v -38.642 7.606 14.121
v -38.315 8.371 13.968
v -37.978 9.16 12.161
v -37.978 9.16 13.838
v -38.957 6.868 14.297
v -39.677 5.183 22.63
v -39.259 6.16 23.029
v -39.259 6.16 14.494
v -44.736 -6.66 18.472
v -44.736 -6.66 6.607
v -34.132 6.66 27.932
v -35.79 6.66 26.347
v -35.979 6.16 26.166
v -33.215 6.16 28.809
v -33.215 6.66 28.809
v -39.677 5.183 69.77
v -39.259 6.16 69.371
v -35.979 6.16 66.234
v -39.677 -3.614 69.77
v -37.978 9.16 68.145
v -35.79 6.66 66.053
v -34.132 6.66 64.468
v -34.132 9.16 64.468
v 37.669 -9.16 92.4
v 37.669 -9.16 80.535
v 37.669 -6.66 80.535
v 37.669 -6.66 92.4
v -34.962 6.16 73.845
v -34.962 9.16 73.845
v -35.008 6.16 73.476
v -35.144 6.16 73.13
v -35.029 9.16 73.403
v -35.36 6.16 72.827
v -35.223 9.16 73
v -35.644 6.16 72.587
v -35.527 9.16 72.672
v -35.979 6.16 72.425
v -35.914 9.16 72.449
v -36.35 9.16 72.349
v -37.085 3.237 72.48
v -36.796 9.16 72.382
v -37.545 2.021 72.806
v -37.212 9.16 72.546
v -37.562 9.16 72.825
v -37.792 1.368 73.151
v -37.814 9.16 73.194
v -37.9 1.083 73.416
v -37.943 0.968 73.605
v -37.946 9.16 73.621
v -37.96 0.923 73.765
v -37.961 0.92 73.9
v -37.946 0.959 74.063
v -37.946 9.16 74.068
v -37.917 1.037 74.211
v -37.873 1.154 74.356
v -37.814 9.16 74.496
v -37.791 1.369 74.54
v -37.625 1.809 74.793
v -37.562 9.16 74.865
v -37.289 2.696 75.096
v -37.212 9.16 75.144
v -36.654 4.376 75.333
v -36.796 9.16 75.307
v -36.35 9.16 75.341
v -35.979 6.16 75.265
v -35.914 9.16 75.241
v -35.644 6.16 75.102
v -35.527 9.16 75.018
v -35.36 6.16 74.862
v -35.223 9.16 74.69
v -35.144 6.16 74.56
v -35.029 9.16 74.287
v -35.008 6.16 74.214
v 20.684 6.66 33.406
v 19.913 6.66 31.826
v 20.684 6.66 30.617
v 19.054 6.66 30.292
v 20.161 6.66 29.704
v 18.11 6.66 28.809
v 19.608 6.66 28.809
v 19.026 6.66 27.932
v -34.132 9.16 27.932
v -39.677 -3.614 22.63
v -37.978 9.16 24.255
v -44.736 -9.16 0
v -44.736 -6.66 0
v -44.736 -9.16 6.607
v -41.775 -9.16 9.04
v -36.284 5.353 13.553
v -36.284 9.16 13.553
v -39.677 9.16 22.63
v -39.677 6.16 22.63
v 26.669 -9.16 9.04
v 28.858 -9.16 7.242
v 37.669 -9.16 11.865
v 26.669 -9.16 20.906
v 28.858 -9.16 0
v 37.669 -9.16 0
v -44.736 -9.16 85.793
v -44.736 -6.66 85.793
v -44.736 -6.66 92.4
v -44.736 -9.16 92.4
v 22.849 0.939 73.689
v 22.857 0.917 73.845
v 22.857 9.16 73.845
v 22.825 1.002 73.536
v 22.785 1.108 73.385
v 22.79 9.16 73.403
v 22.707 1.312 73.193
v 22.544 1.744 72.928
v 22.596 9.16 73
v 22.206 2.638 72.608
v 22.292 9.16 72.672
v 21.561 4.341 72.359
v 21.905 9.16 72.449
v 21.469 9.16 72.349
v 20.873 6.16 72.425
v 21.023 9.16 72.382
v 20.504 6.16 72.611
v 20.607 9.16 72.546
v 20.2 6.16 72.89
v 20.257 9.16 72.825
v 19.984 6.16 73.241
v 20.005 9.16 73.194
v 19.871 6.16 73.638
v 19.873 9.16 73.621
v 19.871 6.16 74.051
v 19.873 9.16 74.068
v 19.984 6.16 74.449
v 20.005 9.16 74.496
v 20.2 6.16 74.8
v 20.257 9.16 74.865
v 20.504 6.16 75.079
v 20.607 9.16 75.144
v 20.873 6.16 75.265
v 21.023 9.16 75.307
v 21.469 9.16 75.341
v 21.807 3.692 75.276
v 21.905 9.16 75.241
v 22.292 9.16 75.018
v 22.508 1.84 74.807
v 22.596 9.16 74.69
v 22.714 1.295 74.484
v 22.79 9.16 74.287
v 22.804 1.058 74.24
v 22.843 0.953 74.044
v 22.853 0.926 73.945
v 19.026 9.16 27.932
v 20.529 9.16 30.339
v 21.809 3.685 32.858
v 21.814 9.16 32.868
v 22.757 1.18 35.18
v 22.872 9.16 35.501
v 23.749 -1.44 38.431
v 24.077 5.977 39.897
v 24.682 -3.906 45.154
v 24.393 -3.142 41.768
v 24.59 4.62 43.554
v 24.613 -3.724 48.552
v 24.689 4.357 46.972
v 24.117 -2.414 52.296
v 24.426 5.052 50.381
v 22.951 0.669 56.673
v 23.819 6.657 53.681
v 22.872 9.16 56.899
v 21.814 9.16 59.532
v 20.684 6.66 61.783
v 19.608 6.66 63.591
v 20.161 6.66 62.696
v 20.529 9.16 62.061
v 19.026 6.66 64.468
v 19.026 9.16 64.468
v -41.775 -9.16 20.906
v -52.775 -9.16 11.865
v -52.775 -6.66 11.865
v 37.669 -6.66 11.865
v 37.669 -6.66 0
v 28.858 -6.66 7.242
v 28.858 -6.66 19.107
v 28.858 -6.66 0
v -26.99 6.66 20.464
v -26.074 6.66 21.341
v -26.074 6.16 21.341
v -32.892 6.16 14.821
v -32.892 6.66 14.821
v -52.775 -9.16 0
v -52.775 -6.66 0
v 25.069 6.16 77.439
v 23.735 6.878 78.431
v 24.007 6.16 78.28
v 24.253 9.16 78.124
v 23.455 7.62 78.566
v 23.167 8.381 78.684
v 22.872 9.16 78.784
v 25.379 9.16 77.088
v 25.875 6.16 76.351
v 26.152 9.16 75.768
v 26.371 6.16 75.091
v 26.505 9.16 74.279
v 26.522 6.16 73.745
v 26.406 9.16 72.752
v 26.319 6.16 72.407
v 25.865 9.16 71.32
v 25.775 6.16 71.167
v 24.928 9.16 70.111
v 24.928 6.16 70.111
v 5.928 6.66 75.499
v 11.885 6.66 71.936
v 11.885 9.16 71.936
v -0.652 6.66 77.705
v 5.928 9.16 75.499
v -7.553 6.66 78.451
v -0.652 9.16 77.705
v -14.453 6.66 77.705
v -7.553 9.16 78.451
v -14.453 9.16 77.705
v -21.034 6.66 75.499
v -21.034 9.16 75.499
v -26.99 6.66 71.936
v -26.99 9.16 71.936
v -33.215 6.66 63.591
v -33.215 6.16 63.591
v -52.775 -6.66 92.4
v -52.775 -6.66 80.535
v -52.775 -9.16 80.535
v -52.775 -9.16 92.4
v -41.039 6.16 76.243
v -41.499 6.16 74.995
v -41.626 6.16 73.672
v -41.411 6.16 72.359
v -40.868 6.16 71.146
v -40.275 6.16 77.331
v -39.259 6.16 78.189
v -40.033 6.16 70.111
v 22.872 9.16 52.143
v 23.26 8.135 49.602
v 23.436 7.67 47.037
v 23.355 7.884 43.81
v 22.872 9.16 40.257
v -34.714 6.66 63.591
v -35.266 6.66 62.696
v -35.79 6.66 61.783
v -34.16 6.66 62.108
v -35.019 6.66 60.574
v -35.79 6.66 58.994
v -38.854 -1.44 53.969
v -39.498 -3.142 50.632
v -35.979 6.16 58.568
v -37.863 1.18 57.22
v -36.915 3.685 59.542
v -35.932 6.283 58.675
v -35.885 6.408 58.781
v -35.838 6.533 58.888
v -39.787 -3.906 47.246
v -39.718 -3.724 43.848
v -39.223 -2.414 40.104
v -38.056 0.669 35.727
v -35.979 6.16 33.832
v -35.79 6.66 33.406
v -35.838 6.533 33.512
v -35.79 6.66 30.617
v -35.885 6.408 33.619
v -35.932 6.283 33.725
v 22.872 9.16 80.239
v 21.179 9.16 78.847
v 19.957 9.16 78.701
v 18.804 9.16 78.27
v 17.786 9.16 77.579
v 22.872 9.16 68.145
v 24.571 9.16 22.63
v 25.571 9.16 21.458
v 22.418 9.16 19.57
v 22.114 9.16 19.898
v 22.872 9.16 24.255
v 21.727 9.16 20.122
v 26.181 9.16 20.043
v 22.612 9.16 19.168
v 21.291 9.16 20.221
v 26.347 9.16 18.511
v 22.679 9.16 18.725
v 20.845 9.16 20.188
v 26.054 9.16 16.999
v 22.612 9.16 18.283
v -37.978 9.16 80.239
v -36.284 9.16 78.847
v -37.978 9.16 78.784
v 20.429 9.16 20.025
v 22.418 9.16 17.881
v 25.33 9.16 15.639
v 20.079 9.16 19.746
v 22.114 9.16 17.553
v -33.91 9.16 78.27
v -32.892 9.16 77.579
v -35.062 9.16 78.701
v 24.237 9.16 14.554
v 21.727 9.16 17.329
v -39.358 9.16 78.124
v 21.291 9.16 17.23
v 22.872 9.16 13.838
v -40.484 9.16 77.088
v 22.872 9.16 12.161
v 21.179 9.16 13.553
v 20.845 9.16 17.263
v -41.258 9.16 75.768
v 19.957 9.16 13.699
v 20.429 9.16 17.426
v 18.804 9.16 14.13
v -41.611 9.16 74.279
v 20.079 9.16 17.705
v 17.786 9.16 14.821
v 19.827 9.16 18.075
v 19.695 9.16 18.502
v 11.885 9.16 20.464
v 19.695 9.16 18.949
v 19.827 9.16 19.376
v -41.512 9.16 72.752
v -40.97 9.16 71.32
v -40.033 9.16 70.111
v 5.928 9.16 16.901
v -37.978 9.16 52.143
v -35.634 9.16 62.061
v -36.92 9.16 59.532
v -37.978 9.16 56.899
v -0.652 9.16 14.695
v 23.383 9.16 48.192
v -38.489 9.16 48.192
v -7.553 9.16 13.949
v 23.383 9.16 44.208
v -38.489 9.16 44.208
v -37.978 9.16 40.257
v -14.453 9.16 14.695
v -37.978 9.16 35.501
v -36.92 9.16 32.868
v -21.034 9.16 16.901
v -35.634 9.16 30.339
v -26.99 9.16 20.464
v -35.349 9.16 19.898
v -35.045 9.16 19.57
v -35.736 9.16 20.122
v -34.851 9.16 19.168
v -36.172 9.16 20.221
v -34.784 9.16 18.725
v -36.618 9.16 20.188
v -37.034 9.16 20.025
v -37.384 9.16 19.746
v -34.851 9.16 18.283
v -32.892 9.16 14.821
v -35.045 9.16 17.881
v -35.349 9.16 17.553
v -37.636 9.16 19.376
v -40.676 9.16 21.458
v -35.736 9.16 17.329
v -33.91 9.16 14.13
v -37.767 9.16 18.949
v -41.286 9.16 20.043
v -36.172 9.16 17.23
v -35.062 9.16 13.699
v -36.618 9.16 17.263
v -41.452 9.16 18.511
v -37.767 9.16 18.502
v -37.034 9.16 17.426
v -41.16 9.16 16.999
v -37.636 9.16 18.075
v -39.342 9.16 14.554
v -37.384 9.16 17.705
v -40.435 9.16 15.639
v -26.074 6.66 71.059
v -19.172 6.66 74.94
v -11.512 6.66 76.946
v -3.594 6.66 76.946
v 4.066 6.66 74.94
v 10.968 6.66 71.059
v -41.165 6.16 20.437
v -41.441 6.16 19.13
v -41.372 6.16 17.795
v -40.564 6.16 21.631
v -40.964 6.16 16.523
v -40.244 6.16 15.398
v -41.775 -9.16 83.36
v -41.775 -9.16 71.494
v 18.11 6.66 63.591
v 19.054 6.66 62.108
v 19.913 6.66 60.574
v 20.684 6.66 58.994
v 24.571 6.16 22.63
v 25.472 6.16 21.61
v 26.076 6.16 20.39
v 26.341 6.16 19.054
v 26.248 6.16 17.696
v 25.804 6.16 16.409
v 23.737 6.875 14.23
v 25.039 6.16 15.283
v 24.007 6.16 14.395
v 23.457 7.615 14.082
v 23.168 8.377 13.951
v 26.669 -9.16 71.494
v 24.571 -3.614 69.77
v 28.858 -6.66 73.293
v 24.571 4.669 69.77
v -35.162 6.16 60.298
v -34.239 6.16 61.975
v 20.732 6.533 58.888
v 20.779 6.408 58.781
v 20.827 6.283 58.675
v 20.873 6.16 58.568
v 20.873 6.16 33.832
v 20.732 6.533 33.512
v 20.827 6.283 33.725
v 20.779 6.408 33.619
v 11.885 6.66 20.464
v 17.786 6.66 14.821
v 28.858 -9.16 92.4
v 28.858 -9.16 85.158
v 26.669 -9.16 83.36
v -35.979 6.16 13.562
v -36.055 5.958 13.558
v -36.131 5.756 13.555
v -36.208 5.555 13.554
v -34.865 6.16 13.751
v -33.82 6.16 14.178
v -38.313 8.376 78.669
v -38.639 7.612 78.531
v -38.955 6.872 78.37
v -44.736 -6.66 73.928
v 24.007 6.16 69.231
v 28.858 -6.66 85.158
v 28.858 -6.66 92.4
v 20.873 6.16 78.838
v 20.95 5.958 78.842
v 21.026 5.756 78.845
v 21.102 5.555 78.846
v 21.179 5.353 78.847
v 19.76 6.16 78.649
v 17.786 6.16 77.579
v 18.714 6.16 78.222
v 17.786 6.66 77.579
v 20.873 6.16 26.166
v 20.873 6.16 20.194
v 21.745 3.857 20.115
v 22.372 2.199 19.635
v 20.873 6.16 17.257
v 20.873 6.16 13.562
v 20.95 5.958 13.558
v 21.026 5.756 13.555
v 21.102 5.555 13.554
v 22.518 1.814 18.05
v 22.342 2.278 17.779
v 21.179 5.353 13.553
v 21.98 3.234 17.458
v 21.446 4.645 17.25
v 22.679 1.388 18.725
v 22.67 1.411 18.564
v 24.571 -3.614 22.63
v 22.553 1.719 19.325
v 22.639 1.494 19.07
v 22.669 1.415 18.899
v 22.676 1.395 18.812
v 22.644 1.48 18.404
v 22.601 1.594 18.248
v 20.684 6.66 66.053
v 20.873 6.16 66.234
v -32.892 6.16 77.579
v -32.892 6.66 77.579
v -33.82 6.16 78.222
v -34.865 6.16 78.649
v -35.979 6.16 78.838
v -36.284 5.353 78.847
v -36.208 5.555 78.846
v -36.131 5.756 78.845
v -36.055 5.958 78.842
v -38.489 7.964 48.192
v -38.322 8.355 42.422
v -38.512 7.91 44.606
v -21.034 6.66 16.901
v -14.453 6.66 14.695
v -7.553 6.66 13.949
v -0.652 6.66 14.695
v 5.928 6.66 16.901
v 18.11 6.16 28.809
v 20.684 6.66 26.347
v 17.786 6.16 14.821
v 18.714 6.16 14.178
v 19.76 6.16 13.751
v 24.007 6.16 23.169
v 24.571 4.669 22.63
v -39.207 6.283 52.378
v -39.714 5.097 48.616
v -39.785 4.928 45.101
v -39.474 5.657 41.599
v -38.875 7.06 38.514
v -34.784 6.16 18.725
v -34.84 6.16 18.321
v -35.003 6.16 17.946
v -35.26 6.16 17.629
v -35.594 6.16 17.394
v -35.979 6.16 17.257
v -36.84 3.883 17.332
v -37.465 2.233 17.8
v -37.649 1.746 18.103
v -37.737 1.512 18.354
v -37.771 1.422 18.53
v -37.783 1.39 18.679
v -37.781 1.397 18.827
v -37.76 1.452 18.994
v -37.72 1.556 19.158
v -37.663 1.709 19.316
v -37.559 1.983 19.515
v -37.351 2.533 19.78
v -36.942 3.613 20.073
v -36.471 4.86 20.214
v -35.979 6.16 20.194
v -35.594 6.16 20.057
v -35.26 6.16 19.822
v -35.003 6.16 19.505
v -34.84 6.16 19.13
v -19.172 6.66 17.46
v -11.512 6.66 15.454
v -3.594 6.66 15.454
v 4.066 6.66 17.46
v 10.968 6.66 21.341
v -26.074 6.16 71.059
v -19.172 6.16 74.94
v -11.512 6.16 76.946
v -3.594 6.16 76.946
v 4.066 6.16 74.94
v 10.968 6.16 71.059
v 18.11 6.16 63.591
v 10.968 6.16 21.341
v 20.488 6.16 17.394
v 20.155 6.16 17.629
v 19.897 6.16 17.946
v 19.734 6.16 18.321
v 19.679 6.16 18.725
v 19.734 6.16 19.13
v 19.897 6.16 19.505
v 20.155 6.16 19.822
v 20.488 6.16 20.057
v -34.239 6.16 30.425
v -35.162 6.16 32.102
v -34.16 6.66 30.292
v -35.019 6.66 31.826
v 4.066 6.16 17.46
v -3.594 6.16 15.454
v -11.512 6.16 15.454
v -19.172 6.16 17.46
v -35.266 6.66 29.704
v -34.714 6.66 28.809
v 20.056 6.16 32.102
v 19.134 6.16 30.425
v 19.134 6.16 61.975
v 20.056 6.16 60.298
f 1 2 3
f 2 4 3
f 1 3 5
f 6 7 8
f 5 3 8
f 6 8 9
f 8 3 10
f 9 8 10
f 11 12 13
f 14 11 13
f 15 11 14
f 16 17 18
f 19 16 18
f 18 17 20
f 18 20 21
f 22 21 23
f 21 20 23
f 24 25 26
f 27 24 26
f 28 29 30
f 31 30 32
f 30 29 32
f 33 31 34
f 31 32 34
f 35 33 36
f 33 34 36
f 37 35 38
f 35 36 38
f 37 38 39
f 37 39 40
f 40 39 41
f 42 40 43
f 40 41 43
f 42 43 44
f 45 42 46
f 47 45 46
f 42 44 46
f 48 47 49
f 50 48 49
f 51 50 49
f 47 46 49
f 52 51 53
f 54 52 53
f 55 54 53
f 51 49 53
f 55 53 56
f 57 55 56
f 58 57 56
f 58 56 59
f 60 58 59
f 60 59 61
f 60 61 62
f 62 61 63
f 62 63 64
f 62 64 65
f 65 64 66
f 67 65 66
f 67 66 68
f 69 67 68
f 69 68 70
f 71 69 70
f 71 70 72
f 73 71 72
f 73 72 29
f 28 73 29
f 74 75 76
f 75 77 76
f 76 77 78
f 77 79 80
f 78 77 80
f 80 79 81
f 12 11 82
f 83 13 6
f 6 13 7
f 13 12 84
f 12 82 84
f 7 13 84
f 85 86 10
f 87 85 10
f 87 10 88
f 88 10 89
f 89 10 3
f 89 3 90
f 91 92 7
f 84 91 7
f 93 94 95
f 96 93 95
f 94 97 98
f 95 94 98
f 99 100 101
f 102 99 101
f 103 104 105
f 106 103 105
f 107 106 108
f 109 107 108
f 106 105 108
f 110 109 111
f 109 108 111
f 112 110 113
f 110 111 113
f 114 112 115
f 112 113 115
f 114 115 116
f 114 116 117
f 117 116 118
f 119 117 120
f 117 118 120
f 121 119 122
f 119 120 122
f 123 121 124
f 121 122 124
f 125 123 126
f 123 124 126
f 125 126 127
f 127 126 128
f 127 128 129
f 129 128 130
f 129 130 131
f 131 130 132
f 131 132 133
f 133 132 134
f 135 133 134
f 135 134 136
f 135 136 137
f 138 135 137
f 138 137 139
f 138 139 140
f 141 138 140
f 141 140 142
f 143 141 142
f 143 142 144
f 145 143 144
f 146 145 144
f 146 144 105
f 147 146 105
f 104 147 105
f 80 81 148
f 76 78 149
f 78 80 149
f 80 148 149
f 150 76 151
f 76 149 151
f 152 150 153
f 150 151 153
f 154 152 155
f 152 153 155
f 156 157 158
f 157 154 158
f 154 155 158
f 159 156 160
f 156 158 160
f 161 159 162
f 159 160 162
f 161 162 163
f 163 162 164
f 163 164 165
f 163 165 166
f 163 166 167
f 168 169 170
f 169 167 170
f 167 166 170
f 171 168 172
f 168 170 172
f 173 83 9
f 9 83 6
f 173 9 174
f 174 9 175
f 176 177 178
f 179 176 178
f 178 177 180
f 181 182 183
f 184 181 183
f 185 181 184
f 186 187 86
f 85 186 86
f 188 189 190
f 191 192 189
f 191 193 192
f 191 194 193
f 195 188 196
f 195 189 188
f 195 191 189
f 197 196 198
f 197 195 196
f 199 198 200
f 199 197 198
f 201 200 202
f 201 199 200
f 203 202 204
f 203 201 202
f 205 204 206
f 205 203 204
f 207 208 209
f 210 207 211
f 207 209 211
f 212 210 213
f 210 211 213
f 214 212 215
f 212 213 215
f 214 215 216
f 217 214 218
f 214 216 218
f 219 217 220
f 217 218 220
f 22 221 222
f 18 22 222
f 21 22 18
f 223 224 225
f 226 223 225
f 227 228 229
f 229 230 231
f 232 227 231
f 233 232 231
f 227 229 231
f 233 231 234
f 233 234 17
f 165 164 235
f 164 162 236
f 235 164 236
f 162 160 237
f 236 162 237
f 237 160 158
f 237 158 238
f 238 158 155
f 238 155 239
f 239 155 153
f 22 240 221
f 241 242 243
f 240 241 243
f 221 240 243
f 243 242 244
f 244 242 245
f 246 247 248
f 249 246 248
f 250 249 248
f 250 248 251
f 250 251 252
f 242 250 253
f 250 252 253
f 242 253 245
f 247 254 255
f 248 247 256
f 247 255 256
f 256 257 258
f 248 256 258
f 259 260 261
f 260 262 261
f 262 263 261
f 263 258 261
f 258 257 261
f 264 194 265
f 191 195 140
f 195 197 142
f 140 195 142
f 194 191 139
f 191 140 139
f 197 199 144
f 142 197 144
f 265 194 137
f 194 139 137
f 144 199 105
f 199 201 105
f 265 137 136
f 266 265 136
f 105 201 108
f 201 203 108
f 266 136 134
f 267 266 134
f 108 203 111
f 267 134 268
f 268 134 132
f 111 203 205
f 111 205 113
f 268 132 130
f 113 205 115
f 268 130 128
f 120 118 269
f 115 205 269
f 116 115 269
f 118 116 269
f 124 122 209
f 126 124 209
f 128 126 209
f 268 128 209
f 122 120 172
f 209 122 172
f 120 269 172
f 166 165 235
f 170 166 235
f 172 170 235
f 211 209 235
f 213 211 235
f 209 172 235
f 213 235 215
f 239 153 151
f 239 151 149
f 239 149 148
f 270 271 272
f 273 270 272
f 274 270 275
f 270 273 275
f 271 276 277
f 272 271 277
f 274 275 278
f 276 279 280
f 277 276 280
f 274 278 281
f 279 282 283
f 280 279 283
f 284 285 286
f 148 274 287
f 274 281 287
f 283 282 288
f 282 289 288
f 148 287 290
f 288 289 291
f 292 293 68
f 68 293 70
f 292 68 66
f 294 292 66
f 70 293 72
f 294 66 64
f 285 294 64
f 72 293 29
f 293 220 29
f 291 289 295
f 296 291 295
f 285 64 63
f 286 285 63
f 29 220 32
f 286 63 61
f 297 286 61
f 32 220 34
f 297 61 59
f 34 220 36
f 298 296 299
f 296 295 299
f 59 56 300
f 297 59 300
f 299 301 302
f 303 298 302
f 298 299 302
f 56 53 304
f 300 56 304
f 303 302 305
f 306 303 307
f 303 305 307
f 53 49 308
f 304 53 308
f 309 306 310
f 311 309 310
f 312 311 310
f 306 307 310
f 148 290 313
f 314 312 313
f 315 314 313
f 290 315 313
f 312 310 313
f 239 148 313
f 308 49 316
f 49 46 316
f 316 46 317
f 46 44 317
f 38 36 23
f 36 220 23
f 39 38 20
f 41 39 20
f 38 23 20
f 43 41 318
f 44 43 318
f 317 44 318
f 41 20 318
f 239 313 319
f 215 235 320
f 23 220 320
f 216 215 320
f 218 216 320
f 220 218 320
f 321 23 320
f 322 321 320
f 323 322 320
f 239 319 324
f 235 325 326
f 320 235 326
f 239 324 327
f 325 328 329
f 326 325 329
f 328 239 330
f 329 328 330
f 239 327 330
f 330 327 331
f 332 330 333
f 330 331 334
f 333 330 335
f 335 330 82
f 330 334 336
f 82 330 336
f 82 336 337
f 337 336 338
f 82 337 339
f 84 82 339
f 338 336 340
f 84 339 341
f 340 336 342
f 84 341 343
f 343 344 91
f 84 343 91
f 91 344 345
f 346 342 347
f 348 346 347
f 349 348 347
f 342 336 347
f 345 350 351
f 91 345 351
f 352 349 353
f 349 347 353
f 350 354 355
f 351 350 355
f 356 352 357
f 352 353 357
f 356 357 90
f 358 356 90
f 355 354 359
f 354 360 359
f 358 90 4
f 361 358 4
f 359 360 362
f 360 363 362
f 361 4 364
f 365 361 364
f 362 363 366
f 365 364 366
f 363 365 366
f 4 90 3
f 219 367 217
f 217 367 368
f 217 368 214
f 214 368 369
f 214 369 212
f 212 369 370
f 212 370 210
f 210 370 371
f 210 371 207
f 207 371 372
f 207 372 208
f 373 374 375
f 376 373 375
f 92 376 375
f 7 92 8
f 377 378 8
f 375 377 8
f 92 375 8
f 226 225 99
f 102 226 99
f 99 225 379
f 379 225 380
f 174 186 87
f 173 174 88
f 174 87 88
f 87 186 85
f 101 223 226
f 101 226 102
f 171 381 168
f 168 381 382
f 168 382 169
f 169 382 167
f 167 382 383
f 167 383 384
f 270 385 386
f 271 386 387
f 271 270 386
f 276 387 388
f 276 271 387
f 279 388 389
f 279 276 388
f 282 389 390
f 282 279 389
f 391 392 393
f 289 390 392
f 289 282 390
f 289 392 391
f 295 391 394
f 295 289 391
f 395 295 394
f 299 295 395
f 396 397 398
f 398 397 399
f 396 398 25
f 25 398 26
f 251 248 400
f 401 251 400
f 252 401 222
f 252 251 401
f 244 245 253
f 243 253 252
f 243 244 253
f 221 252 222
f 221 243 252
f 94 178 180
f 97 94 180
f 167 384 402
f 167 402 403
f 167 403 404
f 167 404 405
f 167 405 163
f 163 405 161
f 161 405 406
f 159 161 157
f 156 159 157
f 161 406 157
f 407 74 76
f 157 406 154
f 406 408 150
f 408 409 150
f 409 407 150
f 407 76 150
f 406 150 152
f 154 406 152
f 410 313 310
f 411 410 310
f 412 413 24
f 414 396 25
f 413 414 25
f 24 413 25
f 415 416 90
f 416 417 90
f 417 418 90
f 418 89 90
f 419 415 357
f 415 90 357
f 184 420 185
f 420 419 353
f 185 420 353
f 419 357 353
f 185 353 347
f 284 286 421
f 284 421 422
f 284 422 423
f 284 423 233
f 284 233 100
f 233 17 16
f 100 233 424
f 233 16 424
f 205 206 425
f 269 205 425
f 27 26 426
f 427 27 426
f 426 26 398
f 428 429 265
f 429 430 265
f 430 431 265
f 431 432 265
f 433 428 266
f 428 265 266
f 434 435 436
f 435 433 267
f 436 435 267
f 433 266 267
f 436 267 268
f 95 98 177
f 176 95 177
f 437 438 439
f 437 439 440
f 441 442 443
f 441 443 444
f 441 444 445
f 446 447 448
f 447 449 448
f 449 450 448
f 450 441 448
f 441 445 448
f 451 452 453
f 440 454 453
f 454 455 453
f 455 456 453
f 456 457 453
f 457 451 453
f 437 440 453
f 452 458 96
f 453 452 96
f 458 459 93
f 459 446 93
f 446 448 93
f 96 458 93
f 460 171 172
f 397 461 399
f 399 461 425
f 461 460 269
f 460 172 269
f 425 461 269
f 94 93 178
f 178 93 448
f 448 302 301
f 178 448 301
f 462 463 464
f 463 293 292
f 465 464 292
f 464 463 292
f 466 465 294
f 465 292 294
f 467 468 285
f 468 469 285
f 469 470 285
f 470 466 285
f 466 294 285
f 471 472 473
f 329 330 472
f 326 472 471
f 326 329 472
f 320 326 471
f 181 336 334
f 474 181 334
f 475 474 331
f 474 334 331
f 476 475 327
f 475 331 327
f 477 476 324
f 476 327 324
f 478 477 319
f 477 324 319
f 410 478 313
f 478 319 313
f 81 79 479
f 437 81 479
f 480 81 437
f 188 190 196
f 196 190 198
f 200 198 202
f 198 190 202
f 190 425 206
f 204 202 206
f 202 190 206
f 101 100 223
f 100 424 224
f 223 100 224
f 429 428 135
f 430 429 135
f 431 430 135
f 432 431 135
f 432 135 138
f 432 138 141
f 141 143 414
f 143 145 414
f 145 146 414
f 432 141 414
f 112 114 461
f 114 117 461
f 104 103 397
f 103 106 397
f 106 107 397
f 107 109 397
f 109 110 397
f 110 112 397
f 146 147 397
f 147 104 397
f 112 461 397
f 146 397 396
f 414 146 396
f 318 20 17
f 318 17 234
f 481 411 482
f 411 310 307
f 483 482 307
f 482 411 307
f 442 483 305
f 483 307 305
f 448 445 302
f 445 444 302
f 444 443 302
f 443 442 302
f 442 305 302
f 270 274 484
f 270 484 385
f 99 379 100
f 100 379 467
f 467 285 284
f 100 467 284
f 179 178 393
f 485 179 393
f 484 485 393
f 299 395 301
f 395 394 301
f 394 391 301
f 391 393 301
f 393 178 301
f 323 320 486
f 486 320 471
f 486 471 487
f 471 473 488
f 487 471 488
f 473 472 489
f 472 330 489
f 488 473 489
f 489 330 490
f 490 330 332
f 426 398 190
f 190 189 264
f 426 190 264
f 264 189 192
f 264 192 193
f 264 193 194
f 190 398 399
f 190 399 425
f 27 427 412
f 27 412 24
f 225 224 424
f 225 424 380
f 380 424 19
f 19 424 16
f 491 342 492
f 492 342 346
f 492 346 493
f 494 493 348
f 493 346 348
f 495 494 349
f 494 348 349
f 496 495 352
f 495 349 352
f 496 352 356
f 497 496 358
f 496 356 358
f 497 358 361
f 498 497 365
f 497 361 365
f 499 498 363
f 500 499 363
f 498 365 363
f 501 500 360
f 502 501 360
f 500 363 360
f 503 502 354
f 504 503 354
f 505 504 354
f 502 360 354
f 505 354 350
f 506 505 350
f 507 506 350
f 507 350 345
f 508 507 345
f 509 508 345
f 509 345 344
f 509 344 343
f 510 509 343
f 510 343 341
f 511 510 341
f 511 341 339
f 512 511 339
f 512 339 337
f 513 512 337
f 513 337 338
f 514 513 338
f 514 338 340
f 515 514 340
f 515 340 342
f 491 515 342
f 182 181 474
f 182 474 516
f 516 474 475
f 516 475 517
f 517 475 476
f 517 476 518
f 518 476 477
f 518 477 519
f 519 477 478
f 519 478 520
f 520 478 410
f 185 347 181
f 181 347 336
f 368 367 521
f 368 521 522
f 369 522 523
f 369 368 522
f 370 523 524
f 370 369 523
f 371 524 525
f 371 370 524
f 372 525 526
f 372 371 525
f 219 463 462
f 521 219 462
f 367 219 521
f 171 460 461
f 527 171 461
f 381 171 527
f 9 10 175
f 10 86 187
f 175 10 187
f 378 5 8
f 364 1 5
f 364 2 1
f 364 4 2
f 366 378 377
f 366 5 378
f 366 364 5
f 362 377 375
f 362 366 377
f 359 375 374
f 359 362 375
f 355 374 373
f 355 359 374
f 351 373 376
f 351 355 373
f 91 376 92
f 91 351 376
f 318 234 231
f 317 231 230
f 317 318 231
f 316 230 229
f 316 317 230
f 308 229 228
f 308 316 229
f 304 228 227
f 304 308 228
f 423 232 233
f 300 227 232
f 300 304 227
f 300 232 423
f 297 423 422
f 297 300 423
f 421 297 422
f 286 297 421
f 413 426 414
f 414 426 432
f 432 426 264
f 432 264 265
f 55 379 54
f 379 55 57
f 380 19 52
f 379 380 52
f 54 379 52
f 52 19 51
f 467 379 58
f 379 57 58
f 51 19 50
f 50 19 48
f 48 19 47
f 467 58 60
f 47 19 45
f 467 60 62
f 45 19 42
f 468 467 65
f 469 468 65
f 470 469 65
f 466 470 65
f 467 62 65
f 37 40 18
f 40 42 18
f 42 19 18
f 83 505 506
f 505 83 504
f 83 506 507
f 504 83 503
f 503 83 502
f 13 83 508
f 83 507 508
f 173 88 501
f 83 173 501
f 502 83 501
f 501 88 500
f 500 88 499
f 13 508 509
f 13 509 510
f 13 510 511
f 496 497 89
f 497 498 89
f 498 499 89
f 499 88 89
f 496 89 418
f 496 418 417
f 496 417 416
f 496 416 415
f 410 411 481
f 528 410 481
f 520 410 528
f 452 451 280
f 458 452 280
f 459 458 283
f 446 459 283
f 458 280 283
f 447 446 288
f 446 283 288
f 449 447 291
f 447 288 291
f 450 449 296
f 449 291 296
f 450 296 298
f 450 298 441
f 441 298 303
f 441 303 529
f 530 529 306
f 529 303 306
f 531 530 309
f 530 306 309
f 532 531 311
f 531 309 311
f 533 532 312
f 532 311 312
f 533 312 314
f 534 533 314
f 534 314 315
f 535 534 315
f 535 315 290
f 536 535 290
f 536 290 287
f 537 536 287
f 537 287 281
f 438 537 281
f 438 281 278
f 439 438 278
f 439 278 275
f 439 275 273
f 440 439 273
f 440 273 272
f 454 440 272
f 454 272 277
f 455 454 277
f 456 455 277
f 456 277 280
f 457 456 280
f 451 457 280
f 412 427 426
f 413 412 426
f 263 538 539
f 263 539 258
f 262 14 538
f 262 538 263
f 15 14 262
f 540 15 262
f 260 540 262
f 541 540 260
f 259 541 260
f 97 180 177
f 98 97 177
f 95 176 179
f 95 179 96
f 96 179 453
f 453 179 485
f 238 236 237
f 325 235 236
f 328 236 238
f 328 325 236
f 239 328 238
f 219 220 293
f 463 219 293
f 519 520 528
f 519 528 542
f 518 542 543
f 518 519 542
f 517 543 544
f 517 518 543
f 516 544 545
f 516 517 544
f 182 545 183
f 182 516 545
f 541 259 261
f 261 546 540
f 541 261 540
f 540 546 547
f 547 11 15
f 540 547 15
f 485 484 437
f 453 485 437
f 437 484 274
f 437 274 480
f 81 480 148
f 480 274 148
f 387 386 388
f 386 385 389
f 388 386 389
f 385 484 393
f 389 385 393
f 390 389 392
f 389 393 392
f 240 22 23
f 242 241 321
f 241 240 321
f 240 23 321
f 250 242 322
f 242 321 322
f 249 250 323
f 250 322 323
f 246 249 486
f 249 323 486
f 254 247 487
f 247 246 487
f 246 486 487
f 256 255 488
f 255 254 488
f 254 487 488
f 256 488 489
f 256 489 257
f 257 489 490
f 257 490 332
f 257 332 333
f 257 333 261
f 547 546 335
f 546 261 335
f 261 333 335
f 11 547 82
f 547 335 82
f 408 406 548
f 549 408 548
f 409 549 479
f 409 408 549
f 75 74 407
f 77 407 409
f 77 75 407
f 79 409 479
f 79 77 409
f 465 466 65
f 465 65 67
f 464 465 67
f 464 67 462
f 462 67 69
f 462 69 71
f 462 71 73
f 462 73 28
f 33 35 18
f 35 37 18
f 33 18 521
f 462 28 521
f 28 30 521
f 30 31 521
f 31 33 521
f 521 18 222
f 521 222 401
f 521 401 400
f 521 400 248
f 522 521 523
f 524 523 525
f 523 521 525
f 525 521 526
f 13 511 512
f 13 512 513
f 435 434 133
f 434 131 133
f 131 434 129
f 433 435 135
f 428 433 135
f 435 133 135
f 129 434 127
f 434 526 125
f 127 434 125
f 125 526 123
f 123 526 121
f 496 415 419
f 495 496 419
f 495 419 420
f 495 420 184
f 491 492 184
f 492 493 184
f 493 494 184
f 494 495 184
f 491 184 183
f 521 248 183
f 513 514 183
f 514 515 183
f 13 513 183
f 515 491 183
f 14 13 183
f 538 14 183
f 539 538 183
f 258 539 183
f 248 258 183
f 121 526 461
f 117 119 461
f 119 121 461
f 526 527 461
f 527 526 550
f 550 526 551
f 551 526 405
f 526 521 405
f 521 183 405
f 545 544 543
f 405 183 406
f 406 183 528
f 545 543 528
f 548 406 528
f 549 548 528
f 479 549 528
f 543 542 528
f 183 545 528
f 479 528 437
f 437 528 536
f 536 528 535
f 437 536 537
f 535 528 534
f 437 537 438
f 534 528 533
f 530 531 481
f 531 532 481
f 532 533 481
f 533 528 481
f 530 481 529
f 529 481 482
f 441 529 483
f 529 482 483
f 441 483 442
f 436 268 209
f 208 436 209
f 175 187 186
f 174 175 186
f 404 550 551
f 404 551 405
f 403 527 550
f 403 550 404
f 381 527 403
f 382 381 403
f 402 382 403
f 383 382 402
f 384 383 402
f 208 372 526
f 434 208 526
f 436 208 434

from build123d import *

# Parameters (mm, degrees)
BOSS_EXTRUDE1_DEPTH = 92.4
BOSS_EXTRUDE2_DEPTH = 3
SKETCH3_R           = 1.5
CUT_EXTRUDE1_DEPTH  = 19.319620864
CUT_EXTRUDE2_DEPTH  = 19.319620864


with BuildPart() as part:
    # Sketch1 → Boss-Extrude1 (new body)
    with BuildSketch(Plane.XY):
        Polygon((-52.775, -9.159810432), (-41.775, -9.159810432), (-35.789647492, 6.659810432), (20.684055398, 6.659810432), (26.669407906, -9.159810432), (37.669407906, -9.159810432), (37.669407906, -6.659810432), (28.857556463, -6.659810432), (22.872203955, 9.159810432), (-37.977796049, 9.159810432), (-44.73566716, -6.659810432), (-52.775, -6.659810432), align=None)
    extrude(amount=BOSS_EXTRUDE1_DEPTH)

    # Sketch2 → Boss-Extrude2 (add)
    with BuildSketch(Plane(origin=(0, 9.159810432, 0), x_dir=(1, 0, 0), z_dir=(0, 1, 0))):
        with BuildLine():
            Line((-32.891525537, -77.579025356), (-26.07351169, -71.059265718))
            ThreePointArc((-26.07351169, -71.059265718), (-7.552796047, -77.2), (10.967919597, -71.059265718))
            Line((10.967919597, -71.059265718), (17.785933443, -77.579025356))
            ThreePointArc((17.785933443, -77.579025356), (25.090877354, -77.415674983), (24.927526982, -70.110731072))
            Line((24.927526982, -70.110731072), (18.109513135, -63.590971435))
            ThreePointArc((18.109513135, -63.590971435), (23.447203953, -46.2), (18.109513135, -28.809028565))
            Line((18.109513135, -28.809028565), (24.571212266, -22.629996647))
            ThreePointArc((24.571212266, -22.629996647), (25.083083856, -15.332846234), (17.785933443, -14.820974644))
            Line((17.785933443, -14.820974644), (10.967919597, -21.340734282))
            ThreePointArc((10.967919597, -21.340734282), (-7.552796047, -15.2), (-26.07351169, -21.340734282))
            Line((-26.07351169, -21.340734282), (-32.891525537, -14.820974644))
            ThreePointArc((-32.891525537, -14.820974644), (-40.188675949, -15.332846234), (-39.676804359, -22.629996647))
            Line((-39.676804359, -22.629996647), (-33.215105229, -28.809028565))
            ThreePointArc((-33.215105229, -28.809028565), (-38.552796047, -46.2), (-33.215105229, -63.590971435))
            Line((-33.215105229, -63.590971435), (-40.033119075, -70.110731072))
            ThreePointArc((-40.033119075, -70.110731072), (-40.196469448, -77.415674983), (-32.891525537, -77.579025356))
        make_face()
    extrude(amount=-BOSS_EXTRUDE2_DEPTH)

    # Sketch3 → Cut-Extrude1 (cut, through all)
    with BuildSketch(Plane(origin=(0, 9.159810432, 0), x_dir=(1, 0, 0), z_dir=(0, 1, 0))):
        with Locations((-36.284164948, -18.725485646)):
            Circle(SKETCH3_R)
        with Locations((21.178572854, -18.725485646)):
            Circle(SKETCH3_R)
        with Locations((-36.462322306, -73.844878214)):
            Circle(SKETCH3_R)
        with Locations((21.356730213, -73.844878214)):
            Circle(SKETCH3_R)
    extrude(amount=-CUT_EXTRUDE1_DEPTH, mode=Mode.SUBTRACT)

    # Sketch4 → Cut-Extrude2 (cut, through all)
    with BuildSketch(Plane(origin=(0, 9.159810432, 0), x_dir=(1, 0, 0), z_dir=(0, 1, 0))):
        with BuildLine():
            Line((-44.73566716, -6.607100908), (-36.284164948, -13.552941945))
            ThreePointArc((-36.284164948, -13.552941945), (-34.473232239, -13.880309585), (-32.891525537, -14.820974644))
            Line((-32.891525537, -14.820974644), (-26.99023083, -20.464117047))
            ThreePointArc((-26.99023083, -20.464117047), (-7.552796047, -13.948650534), (11.884638737, -20.464117047))
            Line((11.884638737, -20.464117047), (17.785933443, -14.820974644))
            ThreePointArc((17.785933443, -14.820974644), (19.367640146, -13.880309585), (21.178572854, -13.552941945))
            Line((21.178572854, -13.552941945), (28.857556463, -7.241992941))
            Line((28.857556463, -7.241992941), (28.857556463, 0))
            Line((28.857556463, 0), (-44.73566716, 0))
            Line((-44.73566716, 0), (-44.73566716, -6.607100908))
        make_face()
        with BuildLine():
            Line((28.857556463, -85.158007059), (21.178572854, -78.847058055))
            ThreePointArc((21.178572854, -78.847058055), (19.367640146, -78.519690415), (17.785933443, -77.579025356))
            Line((17.785933443, -77.579025356), (11.884638737, -71.935882953))
            ThreePointArc((11.884638737, -71.935882953), (-7.552796047, -78.451349466), (-26.99023083, -71.935882953))
            Line((-26.99023083, -71.935882953), (-32.891525537, -77.579025356))
            ThreePointArc((-32.891525537, -77.579025356), (-34.473232239, -78.519690415), (-36.284164948, -78.847058055))
            Line((-36.284164948, -78.847058055), (-44.73566716, -85.792899092))
            Line((-44.73566716, -85.792899092), (-44.73566716, -92.4))
            Line((-44.73566716, -92.4), (28.857556463, -92.4))
            Line((28.857556463, -92.4), (28.857556463, -85.158007059))
        make_face()
        with BuildLine():
            Line((-39.676804359, -22.629996647), (-52.775, -11.865284942))
            Line((-52.775, -11.865284942), (-52.775, -80.534715058))
            Line((-52.775, -80.534715058), (-39.676804359, -69.770003353))
            Line((-39.676804359, -69.770003353), (-34.131824369, -64.46758867))
            ThreePointArc((-34.131824369, -64.46758867), (-39.804145512, -46.2), (-34.131824369, -27.93241133))
            Line((-34.131824369, -27.93241133), (-39.676804359, -22.629996647))
        make_face()
        with BuildLine():
            Line((24.571212266, -69.770003353), (37.669407906, -80.534715058))
            Line((37.669407906, -80.534715058), (37.669407906, -11.865284942))
            Line((37.669407906, -11.865284942), (24.571212266, -22.629996647))
            Line((24.571212266, -22.629996647), (19.026232275, -27.93241133))
            ThreePointArc((19.026232275, -27.93241133), (24.698553419, -46.2), (19.026232275, -64.46758867))
            Line((19.026232275, -64.46758867), (24.571212266, -69.770003353))
        make_face()
    extrude(amount=-CUT_EXTRUDE2_DEPTH, mode=Mode.SUBTRACT)


solid = part.part
